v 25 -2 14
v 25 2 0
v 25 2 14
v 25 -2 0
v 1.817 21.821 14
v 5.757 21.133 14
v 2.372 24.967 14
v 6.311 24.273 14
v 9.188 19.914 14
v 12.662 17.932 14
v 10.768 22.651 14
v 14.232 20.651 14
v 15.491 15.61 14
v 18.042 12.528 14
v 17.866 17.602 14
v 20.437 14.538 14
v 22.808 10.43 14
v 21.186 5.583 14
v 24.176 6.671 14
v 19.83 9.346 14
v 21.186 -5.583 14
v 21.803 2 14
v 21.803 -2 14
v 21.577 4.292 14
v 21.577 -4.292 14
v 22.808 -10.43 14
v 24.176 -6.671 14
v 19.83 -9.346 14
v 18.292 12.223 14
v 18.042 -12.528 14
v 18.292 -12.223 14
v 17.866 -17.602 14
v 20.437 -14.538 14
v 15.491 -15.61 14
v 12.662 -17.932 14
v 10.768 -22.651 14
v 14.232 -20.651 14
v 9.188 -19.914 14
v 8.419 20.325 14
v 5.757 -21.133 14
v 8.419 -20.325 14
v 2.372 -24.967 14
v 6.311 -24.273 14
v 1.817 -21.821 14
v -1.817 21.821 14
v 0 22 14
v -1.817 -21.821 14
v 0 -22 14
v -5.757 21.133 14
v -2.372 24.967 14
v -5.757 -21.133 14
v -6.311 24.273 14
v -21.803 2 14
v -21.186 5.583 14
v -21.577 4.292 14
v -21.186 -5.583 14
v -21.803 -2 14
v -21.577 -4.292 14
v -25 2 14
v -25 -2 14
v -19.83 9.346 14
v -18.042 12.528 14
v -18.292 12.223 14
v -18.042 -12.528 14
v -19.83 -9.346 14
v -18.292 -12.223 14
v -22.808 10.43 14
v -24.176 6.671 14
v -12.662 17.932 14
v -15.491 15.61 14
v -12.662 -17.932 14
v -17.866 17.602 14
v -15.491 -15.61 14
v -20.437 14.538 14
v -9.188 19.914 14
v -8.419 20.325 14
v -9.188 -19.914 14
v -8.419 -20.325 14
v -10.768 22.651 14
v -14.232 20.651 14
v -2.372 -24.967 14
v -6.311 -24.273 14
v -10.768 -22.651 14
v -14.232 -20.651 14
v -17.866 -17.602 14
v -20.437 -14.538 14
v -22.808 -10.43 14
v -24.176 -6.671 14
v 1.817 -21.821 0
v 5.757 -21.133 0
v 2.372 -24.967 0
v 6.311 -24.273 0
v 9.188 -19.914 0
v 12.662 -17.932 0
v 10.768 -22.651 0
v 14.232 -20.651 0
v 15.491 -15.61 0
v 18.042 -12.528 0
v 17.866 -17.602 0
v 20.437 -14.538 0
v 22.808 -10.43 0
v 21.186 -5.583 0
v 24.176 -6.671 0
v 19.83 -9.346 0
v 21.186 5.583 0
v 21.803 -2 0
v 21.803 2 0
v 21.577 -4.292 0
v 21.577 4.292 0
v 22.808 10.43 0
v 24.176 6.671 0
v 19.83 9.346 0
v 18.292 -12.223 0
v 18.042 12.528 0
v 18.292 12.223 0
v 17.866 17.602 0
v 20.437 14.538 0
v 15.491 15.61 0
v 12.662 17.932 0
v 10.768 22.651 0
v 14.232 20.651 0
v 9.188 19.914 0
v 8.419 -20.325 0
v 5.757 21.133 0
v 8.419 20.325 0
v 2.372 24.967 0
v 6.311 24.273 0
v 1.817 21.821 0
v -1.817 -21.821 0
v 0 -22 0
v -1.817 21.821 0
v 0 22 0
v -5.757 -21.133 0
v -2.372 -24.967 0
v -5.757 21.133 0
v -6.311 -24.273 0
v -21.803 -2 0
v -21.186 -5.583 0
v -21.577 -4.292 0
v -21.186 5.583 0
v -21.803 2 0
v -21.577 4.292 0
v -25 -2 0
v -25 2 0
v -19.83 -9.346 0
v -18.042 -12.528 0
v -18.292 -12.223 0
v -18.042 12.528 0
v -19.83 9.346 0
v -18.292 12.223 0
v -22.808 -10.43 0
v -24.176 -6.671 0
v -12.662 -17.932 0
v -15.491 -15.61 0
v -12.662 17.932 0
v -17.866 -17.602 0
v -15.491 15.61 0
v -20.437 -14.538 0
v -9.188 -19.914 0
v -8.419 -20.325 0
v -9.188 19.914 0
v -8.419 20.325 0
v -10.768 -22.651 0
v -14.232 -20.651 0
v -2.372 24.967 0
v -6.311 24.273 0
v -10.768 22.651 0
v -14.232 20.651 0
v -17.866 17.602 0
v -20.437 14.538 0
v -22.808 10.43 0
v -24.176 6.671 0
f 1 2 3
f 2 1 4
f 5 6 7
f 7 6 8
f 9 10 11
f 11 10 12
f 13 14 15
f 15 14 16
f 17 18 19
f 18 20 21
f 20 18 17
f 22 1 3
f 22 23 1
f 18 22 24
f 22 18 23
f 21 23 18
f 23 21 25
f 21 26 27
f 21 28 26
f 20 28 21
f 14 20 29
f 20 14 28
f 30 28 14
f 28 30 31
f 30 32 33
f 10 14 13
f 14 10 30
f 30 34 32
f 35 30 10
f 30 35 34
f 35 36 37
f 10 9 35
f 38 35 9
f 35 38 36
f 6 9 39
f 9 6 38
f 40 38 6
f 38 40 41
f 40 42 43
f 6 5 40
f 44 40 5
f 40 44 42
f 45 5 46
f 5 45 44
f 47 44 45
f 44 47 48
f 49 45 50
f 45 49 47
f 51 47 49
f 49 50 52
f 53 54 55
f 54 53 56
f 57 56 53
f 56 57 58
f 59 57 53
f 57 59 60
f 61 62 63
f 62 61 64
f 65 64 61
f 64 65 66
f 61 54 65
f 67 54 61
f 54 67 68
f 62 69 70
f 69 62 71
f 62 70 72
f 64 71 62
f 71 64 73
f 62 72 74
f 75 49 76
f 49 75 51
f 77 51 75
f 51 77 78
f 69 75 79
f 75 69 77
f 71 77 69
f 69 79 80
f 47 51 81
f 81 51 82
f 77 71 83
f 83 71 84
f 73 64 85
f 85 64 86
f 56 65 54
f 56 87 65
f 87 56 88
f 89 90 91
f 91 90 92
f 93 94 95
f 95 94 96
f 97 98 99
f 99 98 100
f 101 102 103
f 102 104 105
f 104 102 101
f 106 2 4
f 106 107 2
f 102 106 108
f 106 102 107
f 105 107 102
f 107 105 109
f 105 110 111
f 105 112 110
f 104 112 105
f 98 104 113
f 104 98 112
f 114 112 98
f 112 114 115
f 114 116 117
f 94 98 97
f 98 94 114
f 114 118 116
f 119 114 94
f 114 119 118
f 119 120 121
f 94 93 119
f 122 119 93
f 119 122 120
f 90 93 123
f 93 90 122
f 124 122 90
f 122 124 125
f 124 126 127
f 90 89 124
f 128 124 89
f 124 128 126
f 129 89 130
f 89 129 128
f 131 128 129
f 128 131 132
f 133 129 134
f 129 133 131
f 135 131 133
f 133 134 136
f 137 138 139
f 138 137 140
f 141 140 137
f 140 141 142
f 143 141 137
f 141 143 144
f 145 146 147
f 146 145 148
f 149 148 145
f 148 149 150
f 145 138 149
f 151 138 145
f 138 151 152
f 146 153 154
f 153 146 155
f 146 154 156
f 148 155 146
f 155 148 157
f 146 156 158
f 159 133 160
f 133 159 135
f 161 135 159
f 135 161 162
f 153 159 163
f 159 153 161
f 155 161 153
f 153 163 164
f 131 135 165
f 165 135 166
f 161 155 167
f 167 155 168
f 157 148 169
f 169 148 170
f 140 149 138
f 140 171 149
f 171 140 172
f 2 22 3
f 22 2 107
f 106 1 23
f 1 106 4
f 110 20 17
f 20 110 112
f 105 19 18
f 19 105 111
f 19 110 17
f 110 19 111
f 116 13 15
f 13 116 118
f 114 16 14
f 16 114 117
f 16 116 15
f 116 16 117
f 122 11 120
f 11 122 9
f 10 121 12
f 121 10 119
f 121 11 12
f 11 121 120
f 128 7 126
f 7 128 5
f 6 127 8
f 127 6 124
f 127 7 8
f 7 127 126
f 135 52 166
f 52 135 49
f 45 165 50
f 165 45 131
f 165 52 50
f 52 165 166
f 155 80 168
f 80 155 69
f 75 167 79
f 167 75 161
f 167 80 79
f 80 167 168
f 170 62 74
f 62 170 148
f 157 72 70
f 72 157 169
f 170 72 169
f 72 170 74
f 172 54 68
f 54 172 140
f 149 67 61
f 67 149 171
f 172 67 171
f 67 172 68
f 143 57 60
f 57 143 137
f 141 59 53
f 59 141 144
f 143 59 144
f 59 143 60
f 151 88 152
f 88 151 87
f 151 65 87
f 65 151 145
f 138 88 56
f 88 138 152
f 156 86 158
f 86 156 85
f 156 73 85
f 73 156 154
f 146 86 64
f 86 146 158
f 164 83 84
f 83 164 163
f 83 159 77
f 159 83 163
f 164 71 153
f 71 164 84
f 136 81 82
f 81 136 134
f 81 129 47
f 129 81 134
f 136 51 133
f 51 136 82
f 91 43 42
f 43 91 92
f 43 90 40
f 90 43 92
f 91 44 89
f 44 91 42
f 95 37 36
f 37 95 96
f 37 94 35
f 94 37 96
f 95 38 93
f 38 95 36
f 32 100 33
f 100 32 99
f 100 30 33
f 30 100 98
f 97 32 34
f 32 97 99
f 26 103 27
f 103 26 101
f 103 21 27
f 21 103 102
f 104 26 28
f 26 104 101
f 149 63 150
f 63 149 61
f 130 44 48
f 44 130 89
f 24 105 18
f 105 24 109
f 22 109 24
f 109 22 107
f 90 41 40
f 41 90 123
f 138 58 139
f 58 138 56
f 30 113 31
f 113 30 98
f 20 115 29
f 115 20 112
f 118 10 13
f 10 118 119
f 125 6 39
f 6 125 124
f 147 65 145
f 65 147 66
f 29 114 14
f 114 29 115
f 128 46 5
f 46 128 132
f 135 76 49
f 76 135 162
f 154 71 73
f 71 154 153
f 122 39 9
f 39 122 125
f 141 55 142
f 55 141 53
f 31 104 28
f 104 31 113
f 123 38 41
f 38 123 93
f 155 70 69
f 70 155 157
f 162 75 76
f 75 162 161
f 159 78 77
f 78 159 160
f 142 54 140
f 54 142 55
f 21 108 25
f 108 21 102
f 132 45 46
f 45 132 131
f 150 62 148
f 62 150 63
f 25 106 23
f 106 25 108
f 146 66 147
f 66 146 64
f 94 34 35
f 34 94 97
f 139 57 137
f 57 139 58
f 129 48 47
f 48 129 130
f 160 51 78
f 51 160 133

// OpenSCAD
$fn = 32;

// ----------------------------------------------------------------------
// Spur blank: plain gear blank
// ----------------------------------------------------------------------

// --- parameters (mm) ---
disc_r = 22;              // blank root radius
disc_t = 14;              // blank thickness
n_teeth = 18;             // stub tooth count
tooth_w = 4;              // tooth width at the root
tooth_h = 3;              // tooth height above the root
fit_tol = 0.02;           // tolerance for press fits, mm
free_tol = 0.2;           // tolerance for clearance fits, mm

out_r = disc_r + tooth_h;  // tip radius
bbox_x = 50.0;  // measured width over the teeth
bbox_y = 49.93;  // measured depth over the teeth

union() {
  cylinder(r = disc_r, h = disc_t);
  for (i = [0 : n_teeth - 1])
    rotate([0, 0, i * 360 / n_teeth])
      translate([disc_r - 1, -tooth_w / 2, 0])
        cube([tooth_h + 1, tooth_w, disc_t]);
}
